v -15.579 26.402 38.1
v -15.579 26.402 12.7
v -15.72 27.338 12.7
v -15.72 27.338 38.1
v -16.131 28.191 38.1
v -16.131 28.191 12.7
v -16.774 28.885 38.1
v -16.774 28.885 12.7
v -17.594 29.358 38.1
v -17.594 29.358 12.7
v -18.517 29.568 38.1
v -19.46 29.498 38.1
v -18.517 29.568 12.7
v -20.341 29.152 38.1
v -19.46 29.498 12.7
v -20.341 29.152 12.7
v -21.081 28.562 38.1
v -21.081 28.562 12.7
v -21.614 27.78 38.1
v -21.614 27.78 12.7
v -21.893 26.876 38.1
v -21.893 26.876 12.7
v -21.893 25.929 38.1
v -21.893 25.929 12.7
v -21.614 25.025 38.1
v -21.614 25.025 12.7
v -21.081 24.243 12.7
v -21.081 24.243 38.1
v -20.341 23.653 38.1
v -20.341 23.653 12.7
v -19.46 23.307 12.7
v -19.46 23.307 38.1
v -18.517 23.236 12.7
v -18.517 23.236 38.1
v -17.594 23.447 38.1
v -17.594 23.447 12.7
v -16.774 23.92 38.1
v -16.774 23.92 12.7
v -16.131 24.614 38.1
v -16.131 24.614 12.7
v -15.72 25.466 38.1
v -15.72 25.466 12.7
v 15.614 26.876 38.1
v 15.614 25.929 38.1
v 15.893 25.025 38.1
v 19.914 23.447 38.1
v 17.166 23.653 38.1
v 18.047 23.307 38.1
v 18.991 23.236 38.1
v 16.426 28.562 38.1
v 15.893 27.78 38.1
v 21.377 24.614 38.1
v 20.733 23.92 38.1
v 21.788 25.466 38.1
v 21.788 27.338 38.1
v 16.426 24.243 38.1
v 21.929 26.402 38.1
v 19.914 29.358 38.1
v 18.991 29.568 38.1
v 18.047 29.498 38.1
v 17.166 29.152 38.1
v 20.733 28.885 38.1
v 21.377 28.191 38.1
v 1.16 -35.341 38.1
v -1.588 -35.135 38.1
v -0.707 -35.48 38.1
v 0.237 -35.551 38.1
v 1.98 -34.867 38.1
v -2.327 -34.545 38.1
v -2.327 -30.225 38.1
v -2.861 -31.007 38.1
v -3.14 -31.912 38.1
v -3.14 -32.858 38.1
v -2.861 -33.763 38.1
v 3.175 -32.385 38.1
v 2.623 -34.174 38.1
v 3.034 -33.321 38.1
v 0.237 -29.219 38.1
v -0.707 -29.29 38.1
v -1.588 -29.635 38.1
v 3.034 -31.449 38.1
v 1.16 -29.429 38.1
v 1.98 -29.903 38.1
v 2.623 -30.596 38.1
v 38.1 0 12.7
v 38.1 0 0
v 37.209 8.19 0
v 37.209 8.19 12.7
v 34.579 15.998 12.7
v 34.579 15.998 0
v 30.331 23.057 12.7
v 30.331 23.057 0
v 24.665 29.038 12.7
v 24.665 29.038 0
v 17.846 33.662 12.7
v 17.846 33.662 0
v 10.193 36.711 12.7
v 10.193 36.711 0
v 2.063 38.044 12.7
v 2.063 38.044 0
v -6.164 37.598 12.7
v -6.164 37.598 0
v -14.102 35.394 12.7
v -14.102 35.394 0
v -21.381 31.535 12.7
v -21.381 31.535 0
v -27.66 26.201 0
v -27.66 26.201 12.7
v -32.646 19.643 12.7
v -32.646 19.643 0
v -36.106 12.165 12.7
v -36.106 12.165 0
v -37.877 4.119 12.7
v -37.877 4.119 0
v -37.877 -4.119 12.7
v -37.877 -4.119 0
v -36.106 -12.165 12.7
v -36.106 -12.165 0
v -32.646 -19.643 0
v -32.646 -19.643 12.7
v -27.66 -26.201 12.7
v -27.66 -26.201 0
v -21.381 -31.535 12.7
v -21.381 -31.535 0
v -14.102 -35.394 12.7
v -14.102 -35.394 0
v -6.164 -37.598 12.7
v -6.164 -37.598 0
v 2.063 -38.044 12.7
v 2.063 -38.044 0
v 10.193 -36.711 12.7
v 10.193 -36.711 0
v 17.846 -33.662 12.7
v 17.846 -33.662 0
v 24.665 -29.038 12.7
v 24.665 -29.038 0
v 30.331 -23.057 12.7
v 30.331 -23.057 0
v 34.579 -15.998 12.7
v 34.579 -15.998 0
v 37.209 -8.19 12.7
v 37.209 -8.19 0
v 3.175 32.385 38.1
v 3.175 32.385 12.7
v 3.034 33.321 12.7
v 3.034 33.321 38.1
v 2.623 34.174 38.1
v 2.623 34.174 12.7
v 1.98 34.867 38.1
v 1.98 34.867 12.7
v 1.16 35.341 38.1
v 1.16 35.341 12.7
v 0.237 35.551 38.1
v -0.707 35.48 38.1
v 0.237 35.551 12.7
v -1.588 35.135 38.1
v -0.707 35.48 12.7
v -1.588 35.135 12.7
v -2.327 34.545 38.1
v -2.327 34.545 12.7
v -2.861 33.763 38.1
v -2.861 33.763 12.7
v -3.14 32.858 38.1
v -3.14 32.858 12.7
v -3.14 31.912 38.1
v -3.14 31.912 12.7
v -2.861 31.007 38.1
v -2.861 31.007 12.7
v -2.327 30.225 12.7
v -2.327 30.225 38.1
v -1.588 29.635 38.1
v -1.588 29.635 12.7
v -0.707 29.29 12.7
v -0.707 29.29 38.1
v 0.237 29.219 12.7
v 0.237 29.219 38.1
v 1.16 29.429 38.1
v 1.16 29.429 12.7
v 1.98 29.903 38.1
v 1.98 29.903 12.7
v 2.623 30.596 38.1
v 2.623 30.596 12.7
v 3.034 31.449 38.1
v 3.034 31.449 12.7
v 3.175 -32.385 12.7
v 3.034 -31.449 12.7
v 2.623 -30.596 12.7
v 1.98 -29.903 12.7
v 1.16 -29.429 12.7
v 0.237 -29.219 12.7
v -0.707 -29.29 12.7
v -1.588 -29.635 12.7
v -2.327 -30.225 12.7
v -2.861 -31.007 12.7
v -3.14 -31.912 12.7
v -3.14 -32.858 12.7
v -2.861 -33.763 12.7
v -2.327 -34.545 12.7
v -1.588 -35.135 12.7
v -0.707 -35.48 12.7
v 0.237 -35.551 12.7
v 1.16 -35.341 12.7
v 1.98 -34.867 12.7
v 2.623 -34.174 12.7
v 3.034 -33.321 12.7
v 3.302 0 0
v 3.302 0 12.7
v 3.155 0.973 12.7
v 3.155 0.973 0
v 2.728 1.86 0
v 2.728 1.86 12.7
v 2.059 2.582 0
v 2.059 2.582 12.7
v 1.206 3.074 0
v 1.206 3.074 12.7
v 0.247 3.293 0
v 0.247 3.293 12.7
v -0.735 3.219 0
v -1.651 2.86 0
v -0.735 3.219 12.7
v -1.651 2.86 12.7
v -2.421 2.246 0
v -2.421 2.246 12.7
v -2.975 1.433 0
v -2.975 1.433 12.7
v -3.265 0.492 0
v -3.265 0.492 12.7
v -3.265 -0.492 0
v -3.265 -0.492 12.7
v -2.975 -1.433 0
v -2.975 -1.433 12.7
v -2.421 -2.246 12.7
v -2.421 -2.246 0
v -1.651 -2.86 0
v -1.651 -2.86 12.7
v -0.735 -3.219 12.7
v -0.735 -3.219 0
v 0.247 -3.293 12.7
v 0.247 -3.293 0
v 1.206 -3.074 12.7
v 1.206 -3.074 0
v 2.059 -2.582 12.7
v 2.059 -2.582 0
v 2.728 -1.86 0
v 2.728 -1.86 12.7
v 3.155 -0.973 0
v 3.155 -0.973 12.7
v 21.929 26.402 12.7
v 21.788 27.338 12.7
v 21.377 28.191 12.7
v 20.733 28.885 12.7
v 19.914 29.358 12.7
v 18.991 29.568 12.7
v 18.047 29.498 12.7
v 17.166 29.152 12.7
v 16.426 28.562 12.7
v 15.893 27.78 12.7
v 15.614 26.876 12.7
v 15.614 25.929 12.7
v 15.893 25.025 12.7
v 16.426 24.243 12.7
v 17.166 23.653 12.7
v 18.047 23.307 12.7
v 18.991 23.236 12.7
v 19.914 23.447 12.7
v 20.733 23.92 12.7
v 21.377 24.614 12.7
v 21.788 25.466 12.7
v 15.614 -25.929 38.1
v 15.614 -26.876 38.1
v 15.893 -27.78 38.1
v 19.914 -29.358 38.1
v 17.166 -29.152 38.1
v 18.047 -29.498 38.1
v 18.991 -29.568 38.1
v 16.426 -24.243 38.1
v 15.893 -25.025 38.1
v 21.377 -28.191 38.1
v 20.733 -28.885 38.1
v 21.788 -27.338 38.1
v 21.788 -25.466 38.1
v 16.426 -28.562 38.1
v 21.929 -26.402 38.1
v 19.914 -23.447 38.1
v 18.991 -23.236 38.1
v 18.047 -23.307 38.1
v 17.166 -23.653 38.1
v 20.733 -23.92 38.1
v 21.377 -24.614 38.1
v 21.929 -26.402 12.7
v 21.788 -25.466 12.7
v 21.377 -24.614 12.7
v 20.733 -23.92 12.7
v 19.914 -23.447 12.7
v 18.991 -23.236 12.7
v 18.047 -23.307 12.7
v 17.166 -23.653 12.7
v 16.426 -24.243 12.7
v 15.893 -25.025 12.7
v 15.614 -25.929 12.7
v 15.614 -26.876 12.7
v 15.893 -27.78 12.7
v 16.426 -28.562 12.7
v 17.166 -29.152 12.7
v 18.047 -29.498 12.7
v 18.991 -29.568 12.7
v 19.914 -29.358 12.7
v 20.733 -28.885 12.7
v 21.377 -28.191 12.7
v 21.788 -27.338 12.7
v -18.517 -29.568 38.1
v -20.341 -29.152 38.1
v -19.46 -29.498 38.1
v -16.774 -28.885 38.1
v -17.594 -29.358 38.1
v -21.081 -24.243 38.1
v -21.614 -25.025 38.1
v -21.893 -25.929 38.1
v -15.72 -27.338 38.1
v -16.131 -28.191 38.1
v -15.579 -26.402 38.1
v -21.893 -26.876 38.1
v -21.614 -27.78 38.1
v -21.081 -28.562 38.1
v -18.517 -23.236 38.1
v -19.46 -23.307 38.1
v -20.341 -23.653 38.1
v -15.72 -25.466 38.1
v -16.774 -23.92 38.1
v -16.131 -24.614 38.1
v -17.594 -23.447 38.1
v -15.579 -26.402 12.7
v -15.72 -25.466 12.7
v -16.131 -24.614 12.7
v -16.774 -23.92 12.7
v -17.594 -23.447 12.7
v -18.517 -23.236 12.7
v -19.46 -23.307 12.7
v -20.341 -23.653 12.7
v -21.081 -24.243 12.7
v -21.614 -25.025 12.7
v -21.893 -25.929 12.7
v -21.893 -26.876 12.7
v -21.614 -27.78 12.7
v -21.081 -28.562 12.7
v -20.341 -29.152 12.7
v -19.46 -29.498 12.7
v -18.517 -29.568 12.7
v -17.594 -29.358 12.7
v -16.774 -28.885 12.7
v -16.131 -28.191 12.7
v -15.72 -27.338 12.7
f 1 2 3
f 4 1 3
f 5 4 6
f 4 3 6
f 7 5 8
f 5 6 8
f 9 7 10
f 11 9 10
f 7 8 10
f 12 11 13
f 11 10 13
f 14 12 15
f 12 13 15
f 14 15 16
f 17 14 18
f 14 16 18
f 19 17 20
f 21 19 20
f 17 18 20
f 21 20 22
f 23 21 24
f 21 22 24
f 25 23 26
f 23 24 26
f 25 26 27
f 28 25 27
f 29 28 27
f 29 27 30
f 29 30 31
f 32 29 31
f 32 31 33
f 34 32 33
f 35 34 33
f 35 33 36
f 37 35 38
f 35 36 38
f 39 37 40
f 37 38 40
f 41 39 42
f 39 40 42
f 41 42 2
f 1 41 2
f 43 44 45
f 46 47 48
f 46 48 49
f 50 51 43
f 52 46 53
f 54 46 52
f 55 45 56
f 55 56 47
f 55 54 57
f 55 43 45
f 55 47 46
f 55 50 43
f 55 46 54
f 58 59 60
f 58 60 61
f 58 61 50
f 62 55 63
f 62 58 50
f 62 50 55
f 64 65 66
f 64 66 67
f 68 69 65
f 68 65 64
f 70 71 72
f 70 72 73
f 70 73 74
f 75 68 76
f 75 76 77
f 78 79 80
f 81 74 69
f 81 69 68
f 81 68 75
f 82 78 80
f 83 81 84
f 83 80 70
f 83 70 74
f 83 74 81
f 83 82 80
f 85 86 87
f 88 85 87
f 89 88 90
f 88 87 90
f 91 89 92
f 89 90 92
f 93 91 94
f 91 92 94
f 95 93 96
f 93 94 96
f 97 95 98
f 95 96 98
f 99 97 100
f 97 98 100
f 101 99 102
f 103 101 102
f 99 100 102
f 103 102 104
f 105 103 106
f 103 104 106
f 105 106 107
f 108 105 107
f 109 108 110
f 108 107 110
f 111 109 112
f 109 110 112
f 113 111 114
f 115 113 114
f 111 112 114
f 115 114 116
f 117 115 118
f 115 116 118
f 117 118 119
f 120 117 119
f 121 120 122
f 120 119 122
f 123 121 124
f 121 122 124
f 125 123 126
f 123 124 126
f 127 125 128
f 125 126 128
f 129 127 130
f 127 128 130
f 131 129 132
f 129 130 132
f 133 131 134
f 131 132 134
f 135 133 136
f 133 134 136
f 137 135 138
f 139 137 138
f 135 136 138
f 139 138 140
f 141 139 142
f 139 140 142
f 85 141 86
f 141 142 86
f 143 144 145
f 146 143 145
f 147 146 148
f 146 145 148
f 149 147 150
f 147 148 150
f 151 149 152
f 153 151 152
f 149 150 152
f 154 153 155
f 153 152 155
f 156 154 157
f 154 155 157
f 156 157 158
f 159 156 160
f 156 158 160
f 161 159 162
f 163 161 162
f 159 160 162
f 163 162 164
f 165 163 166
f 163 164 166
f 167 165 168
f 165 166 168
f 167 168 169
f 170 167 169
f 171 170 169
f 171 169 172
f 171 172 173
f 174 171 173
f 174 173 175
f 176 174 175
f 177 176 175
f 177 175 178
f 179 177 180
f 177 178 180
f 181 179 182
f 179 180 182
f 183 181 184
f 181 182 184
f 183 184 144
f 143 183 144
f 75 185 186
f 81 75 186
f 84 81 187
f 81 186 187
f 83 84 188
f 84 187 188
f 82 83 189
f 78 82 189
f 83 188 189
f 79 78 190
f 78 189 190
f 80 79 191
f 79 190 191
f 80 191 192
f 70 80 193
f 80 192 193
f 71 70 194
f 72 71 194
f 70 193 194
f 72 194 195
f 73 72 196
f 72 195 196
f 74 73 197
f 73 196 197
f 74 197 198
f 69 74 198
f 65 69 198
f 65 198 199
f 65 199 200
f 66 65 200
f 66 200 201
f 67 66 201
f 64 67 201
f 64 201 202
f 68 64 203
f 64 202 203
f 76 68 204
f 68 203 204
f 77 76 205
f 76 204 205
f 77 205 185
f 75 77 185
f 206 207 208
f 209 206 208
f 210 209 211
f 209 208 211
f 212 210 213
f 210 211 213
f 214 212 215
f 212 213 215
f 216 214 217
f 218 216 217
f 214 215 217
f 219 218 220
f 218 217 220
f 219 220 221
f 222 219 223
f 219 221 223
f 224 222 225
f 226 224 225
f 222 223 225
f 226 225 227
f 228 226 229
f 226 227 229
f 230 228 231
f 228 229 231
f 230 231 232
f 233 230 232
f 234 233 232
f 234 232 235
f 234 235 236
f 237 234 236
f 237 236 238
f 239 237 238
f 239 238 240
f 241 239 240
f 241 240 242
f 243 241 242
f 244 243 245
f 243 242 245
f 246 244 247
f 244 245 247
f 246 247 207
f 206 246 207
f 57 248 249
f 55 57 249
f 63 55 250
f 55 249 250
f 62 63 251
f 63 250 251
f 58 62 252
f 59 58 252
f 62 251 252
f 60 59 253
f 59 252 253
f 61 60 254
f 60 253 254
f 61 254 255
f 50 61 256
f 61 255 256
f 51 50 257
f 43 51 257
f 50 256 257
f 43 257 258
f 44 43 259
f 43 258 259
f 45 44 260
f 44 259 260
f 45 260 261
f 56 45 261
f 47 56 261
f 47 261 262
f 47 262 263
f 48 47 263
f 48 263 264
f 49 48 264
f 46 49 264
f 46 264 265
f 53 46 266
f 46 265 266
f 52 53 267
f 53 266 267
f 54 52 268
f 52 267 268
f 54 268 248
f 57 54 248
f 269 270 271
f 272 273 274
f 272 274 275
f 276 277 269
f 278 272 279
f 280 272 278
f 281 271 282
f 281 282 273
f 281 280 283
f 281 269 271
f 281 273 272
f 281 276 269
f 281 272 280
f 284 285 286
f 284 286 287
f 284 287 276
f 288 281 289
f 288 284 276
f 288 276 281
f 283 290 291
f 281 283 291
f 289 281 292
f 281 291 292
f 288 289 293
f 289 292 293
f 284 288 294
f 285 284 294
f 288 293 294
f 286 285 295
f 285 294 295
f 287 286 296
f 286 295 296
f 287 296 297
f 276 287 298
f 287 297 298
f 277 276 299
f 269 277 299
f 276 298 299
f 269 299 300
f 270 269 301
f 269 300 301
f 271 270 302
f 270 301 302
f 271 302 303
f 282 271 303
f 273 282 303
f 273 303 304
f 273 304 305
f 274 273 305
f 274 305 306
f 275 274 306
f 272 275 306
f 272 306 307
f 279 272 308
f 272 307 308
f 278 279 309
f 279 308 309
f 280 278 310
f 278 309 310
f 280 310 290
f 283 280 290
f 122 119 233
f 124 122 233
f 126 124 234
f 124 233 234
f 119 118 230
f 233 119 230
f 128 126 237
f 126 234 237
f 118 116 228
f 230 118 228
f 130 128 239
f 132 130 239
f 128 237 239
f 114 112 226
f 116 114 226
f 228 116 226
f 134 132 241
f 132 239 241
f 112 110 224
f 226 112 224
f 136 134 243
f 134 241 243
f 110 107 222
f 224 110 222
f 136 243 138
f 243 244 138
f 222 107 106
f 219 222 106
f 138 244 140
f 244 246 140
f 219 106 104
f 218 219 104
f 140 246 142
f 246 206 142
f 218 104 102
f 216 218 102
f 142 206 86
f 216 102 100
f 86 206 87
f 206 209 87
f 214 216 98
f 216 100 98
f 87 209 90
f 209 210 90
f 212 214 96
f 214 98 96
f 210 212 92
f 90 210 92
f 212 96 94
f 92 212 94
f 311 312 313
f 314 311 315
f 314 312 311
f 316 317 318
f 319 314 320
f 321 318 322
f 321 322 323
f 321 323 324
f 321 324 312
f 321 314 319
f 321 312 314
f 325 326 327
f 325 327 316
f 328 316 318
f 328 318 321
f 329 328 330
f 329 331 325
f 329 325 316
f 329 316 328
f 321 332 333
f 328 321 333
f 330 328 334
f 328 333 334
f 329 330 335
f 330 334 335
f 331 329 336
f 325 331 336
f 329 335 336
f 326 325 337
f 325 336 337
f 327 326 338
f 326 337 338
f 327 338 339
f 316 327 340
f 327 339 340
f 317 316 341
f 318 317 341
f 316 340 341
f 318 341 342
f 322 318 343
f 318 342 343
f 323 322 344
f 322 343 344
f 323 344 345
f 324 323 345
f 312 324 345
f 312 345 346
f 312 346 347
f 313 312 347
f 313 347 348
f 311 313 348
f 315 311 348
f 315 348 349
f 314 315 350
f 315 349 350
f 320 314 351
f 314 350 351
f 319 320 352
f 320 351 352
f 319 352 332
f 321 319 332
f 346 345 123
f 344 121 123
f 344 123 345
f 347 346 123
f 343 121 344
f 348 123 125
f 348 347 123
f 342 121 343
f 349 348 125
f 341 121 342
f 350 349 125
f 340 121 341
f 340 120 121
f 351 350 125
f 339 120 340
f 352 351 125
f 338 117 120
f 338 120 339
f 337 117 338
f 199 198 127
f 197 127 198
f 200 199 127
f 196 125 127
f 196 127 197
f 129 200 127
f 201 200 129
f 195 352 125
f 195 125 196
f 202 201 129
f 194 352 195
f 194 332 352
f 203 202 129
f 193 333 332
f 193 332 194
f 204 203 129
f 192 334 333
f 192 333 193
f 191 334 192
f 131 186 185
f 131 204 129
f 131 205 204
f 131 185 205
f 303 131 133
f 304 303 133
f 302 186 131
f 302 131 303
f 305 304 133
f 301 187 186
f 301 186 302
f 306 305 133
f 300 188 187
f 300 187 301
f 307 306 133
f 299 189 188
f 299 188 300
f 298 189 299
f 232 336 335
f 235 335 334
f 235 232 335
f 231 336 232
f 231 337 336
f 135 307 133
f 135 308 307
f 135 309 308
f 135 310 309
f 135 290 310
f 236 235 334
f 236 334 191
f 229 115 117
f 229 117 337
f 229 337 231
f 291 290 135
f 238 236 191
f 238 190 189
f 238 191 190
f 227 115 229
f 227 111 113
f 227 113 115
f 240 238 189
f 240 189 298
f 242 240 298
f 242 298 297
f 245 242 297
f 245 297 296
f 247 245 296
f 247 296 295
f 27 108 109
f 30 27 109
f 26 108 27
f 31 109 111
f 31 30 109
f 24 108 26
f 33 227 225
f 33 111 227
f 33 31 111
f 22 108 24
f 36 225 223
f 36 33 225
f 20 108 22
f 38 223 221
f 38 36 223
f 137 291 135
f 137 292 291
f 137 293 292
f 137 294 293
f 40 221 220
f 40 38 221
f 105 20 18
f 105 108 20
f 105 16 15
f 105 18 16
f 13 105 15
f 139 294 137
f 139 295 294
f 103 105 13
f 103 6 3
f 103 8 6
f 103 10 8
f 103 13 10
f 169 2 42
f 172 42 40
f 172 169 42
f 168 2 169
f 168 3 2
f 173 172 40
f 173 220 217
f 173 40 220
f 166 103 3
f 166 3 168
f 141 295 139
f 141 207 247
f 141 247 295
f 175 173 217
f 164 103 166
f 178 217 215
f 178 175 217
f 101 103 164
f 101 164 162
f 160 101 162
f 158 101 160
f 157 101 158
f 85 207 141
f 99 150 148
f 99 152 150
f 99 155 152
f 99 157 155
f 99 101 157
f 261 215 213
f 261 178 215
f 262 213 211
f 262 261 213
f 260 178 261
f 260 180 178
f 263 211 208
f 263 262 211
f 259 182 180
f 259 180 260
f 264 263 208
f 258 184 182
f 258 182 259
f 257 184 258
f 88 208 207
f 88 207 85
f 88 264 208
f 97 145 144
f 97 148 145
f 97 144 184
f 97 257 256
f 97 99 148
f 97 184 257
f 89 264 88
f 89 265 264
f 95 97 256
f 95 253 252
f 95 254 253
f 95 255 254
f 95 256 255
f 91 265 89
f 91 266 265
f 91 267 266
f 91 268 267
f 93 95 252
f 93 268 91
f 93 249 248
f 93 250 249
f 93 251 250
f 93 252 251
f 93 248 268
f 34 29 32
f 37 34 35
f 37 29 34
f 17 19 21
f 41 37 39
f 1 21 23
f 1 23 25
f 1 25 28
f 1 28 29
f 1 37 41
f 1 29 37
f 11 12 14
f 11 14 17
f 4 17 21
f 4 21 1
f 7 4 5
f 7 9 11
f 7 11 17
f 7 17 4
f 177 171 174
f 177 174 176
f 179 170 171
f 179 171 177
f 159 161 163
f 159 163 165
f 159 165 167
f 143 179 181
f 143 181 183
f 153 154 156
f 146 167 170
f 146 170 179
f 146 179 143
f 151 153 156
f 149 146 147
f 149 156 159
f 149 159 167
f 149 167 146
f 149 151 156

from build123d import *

# Parameters (mm, degrees)
F0_R     = 38.1
F1_DEPTH = 12.7
F2_R     = 3.175
F3_DEPTH = 25.4
F4_R     = 3.175
F5_DEPTH = 25.4
F6_R     = 3.302
F7_DEPTH = 12.7


with BuildPart() as f1:
    # F0 (on Top) → F1 (new body)
    with BuildSketch(Plane.XY):
        Circle(F0_R)
    extrude(amount=F1_DEPTH)

    # F2 (on face) → F3 (join)
    with BuildSketch(Plane.XY.offset(12.7)):
        with Locations((0, 32.385)):
            Circle(F2_R)
        with Locations((-18.753842, 26.402304)):
            Circle(F2_R)
        with Locations((18.753842, 26.402304)):
            Circle(F2_R)
    extrude(amount=F3_DEPTH)

    # F4 (on face) → F5 (join)
    with BuildSketch(Plane.XY.offset(12.7)):
        with Locations((-18.753842, -26.402304)):
            Circle(F4_R)
        with Locations((0, -32.385)):
            Circle(F4_R)
        with Locations((18.753842, -26.402304)):
            Circle(F4_R)
    extrude(amount=F5_DEPTH)

    # F6 (on face) → F7 (cut)
    with BuildSketch(Plane.XY.offset(12.7)):
        Circle(F6_R)
    extrude(amount=-F7_DEPTH, mode=Mode.SUBTRACT)


solid = f1.part
